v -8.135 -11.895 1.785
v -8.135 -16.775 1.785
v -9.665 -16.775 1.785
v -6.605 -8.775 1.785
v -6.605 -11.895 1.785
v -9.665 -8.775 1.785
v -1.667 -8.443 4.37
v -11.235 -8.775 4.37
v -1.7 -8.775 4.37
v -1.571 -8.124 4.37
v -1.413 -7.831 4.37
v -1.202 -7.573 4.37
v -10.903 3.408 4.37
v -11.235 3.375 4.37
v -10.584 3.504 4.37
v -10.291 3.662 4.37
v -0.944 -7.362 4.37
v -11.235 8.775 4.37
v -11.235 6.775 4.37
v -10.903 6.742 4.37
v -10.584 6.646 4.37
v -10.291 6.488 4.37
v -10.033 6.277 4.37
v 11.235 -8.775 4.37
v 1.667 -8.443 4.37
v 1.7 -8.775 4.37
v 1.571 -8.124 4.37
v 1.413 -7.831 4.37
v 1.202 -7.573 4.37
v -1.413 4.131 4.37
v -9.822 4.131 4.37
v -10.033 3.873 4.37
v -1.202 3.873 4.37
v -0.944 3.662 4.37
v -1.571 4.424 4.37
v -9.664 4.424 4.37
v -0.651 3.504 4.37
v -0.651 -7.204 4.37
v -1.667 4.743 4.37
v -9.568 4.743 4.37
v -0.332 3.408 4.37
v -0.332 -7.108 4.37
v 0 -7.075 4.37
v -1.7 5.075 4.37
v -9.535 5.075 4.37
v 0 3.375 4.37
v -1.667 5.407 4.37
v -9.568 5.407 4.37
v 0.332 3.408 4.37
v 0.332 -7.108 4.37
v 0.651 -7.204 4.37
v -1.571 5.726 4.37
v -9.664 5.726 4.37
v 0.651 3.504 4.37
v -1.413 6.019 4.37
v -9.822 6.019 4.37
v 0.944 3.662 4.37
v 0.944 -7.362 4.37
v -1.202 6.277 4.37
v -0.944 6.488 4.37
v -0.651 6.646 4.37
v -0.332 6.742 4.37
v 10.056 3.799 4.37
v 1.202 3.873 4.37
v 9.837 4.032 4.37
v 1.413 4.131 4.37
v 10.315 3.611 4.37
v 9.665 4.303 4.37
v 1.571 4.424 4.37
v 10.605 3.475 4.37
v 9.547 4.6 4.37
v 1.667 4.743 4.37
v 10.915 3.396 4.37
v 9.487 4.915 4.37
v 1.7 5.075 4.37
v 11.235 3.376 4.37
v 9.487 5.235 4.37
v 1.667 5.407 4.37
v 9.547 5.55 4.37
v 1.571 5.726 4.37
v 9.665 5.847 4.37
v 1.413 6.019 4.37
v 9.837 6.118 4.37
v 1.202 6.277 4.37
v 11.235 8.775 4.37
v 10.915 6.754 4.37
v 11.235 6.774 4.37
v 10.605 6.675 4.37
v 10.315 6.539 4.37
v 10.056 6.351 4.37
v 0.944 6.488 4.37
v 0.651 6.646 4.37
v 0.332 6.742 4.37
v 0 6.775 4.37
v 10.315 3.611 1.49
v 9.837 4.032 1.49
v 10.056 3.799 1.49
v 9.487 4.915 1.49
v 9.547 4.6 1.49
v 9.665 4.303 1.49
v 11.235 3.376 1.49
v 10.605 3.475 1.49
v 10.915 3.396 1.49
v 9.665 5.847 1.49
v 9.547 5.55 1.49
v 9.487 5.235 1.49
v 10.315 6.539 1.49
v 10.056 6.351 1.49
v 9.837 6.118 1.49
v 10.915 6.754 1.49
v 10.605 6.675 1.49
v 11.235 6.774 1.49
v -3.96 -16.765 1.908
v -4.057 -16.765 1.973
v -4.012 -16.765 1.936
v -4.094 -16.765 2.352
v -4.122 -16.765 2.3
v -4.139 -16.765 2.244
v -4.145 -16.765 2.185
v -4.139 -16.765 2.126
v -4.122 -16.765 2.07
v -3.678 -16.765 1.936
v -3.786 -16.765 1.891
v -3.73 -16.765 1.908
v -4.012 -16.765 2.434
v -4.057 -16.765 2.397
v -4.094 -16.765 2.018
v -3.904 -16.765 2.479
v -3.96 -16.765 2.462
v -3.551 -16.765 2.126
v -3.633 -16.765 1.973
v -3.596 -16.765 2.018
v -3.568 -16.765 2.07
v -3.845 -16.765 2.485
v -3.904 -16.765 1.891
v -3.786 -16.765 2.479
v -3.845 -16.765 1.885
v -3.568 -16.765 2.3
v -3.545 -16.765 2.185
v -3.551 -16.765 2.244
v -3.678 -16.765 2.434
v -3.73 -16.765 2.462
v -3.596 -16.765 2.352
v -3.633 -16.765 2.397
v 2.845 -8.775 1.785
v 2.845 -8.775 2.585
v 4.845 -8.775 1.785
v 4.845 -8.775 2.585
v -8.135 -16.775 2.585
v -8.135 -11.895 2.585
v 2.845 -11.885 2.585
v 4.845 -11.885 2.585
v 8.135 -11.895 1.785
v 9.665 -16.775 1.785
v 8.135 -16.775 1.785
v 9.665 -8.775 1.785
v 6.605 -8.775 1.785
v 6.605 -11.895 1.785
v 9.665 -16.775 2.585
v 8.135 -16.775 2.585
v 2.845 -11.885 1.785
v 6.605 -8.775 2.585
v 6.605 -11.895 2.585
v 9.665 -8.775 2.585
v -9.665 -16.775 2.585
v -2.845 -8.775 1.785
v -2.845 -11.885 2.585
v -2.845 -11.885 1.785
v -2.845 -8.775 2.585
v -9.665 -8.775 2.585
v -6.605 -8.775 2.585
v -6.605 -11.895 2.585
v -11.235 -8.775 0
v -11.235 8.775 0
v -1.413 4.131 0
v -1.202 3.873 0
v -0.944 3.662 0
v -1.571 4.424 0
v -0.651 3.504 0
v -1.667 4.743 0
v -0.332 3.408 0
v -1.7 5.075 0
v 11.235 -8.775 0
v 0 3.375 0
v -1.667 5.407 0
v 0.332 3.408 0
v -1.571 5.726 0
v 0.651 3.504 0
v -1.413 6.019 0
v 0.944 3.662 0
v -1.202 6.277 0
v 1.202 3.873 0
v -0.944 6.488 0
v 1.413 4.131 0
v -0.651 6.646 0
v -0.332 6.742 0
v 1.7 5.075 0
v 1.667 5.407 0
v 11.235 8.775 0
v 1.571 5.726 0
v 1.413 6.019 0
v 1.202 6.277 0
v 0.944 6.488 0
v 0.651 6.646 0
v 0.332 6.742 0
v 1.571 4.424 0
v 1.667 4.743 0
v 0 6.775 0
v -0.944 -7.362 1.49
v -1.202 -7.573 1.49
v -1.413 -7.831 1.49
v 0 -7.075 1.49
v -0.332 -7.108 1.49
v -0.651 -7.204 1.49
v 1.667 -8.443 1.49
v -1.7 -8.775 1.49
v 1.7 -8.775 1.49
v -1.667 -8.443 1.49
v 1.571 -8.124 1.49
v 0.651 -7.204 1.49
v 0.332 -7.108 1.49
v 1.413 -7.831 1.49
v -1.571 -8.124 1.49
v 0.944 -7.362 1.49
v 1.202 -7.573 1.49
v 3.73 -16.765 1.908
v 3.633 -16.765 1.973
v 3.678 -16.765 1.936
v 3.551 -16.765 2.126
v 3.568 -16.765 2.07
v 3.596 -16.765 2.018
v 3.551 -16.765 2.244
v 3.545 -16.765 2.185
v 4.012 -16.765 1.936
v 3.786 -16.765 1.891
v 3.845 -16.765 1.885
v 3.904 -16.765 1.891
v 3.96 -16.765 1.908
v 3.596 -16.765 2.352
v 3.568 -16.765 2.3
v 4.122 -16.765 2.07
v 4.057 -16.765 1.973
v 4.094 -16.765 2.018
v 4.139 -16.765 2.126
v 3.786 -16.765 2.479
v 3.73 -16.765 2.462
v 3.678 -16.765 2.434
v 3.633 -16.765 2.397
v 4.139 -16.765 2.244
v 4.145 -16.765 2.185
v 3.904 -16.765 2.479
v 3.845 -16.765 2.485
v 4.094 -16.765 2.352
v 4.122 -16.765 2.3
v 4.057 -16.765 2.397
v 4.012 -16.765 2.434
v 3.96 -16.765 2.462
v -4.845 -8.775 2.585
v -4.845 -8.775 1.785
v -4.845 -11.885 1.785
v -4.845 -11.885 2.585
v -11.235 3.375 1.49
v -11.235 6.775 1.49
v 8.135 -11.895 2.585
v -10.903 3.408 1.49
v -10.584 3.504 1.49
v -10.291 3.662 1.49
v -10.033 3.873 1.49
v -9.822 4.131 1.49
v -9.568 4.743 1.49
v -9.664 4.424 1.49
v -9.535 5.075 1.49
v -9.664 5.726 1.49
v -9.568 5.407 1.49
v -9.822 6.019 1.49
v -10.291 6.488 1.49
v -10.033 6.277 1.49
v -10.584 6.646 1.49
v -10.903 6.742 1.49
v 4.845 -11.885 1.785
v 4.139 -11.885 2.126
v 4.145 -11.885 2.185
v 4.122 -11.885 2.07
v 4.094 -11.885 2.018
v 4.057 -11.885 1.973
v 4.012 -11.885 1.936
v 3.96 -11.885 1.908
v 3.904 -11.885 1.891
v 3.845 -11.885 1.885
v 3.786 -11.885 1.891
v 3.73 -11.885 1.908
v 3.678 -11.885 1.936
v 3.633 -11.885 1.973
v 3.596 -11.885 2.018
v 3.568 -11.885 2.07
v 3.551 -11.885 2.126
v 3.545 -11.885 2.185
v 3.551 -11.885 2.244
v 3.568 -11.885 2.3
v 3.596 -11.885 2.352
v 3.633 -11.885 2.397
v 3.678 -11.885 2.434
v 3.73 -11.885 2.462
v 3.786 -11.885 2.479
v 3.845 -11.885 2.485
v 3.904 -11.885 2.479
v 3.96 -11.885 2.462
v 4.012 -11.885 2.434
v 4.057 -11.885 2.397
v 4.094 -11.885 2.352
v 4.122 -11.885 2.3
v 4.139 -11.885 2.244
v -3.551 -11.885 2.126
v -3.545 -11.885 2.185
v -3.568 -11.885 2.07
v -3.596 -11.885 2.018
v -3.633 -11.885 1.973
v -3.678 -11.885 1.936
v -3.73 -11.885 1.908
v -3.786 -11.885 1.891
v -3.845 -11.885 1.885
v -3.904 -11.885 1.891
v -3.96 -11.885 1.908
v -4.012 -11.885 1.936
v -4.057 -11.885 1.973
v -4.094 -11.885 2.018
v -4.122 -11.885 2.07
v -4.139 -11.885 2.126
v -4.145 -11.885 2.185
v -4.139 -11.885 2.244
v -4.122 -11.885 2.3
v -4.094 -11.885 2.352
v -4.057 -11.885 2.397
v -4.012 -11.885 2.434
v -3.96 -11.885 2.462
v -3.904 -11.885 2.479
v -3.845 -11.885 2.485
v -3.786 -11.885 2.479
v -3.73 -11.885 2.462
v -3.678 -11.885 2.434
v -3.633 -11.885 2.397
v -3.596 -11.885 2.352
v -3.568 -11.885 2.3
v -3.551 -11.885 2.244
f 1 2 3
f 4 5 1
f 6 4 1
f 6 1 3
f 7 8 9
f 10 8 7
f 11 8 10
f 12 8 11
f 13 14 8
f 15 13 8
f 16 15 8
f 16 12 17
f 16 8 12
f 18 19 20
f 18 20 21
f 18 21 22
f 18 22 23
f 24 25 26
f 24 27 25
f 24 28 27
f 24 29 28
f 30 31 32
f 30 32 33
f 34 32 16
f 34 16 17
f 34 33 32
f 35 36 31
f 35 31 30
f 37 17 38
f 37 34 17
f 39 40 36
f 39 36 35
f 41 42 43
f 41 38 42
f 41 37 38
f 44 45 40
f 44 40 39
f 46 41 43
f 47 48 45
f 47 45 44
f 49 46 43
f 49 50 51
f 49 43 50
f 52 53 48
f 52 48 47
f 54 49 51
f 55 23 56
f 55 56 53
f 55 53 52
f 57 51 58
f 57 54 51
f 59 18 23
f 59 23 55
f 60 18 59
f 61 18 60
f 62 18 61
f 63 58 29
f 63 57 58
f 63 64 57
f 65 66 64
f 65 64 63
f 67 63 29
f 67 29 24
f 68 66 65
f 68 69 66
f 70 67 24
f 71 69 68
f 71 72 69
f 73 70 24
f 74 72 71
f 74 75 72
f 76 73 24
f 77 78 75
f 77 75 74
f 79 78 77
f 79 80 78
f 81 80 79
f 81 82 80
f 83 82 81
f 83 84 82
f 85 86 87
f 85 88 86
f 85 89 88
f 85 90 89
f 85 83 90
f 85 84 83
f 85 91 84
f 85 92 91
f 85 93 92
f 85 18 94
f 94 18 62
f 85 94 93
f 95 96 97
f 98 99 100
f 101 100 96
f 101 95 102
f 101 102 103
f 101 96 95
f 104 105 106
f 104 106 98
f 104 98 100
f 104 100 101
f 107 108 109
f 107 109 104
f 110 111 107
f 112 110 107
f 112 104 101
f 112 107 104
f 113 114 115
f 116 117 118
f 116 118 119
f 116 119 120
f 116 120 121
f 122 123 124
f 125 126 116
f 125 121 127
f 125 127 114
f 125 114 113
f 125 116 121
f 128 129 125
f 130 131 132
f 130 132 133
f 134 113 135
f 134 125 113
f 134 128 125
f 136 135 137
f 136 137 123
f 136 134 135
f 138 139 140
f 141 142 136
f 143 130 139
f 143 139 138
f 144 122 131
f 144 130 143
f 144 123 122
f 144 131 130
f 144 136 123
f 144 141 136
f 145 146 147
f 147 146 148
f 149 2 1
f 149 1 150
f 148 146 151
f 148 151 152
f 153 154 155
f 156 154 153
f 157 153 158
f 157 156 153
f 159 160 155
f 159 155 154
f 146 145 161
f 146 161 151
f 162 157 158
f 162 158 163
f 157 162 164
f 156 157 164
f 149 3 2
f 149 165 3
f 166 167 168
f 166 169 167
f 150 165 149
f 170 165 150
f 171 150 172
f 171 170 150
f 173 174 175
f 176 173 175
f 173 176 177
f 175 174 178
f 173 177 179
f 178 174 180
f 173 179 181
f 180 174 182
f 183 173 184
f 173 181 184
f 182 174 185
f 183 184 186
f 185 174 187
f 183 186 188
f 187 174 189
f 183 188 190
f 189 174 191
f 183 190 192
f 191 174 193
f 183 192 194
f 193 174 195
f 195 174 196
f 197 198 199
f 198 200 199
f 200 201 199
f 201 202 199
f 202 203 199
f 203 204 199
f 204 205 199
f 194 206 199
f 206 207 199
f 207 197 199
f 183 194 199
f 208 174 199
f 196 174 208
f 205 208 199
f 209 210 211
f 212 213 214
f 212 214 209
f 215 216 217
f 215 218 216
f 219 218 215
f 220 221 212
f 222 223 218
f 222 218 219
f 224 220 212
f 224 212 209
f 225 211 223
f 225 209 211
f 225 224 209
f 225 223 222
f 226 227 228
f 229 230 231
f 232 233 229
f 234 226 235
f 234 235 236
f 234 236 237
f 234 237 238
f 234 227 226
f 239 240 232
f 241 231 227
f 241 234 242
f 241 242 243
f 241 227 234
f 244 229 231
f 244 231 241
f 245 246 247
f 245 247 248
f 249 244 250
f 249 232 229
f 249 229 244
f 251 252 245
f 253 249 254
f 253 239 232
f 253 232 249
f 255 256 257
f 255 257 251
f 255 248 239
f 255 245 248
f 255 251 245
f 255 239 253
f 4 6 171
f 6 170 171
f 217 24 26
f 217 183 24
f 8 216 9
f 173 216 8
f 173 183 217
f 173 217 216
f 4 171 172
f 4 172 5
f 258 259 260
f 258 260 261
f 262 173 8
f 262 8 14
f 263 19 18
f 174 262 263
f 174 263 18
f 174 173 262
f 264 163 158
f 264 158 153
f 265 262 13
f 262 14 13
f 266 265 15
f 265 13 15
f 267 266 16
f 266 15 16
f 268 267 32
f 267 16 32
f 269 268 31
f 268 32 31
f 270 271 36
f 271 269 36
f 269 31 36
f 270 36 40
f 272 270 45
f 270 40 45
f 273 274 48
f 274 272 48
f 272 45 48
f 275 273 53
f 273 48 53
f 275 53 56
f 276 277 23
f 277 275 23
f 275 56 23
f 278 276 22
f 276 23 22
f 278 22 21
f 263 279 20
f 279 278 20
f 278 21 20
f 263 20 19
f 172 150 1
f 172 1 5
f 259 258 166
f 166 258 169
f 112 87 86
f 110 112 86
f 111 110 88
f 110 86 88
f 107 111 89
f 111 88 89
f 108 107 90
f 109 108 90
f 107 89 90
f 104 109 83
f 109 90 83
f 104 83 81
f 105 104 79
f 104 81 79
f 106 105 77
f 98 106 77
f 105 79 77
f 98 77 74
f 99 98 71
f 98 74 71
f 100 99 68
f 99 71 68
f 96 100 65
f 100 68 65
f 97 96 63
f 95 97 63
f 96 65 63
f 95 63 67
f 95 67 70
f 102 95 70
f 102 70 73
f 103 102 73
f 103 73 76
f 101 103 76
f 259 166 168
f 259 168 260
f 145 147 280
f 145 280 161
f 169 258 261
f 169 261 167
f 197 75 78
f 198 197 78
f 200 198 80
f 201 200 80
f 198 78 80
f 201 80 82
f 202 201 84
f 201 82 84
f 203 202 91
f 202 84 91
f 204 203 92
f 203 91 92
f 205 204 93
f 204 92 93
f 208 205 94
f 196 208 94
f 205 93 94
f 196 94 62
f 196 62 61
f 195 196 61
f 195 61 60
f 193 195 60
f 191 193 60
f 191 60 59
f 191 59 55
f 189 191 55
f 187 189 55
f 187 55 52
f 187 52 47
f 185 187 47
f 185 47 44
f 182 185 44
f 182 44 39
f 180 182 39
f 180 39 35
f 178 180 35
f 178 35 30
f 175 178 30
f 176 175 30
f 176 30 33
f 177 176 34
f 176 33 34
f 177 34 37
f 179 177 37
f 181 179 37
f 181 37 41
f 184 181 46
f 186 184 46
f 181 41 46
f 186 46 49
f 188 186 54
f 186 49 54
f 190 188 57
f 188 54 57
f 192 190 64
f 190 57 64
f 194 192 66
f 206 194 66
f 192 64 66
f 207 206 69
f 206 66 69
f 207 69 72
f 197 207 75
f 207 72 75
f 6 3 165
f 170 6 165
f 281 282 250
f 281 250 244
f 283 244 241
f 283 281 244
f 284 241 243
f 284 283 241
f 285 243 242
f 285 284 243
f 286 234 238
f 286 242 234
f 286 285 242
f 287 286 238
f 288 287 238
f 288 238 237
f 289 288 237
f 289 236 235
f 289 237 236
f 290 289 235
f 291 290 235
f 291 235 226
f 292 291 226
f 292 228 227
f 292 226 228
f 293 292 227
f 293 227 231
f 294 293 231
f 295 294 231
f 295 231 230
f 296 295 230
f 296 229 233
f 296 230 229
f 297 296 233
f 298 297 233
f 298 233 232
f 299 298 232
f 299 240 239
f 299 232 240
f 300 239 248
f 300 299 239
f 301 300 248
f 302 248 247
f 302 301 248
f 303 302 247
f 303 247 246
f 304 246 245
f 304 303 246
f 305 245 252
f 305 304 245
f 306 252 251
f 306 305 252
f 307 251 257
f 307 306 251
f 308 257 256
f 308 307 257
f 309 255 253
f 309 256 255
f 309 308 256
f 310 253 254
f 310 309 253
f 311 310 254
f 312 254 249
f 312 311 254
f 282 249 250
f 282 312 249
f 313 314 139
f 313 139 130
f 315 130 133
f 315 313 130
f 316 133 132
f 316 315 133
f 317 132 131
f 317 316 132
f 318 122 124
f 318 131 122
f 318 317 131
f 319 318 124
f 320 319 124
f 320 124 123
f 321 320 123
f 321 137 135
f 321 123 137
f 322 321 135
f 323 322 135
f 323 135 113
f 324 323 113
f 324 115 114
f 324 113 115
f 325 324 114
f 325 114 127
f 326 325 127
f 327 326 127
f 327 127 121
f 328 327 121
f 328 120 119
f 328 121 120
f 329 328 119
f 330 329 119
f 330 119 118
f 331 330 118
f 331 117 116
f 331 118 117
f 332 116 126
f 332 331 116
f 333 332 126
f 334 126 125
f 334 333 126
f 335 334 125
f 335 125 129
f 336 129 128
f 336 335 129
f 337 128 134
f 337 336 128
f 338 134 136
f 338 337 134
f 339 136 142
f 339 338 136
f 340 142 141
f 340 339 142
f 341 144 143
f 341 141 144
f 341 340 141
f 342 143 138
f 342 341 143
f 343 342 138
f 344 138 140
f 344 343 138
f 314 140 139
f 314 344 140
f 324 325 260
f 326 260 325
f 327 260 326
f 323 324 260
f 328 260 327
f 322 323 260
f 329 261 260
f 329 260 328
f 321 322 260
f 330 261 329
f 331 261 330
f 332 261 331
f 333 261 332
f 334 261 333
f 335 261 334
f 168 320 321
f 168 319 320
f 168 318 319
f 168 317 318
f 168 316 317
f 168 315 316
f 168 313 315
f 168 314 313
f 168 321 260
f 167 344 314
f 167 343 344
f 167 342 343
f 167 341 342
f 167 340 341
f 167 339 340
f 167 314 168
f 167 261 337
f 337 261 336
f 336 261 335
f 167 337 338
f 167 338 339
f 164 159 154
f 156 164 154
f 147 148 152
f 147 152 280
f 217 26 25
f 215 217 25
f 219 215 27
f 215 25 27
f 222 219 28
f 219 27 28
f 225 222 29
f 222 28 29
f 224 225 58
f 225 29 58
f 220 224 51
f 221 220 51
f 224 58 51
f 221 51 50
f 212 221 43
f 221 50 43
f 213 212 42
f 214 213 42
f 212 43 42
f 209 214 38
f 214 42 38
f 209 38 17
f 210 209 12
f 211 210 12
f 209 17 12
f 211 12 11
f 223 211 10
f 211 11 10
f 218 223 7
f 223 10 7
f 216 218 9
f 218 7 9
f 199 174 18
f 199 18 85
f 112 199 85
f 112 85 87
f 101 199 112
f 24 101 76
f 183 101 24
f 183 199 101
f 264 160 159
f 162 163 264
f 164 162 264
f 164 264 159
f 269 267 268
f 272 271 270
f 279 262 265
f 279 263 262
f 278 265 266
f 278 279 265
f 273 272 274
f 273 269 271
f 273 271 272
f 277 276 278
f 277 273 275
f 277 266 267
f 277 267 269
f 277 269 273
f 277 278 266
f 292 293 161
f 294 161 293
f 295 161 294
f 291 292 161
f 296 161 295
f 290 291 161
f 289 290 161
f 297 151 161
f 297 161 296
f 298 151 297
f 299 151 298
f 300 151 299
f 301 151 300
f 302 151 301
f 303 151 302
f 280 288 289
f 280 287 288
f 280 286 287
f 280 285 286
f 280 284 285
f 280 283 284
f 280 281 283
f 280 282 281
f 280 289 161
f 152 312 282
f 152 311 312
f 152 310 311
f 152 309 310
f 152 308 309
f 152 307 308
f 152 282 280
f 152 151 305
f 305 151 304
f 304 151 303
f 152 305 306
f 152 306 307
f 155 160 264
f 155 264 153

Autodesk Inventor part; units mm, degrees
ref_plane "YZ Plane" through (0, 0, 0) normal (1, 0, 0) x (0, 1, 0)
ref_plane "XZ Plane" through (0, 0, 0) normal (0, 1, 0) x (-1, 0, 0)
ref_plane "XY Plane" through (0, 0, 0) normal (0, 0, 1) x (1, 0, 0)
sketch "Skizze1" plane through (0, 0, 0) normal (0, 0, 1) x (1, 0, 0)
  line L0 (-11.235, 8.775) -> (11.235, 8.775)
  line L1 (11.235, 8.775) -> (11.235, -8.775)
  line L2 (11.235, -8.775) -> (-11.235, -8.775)
  line L3 (-11.235, -8.775) -> (-11.235, 8.775)
  line L4 (-11.235, 8.775) -> (11.235, -8.775) construction
  point P0 (0, 0)
  point P1 (0, 0)
  dimension "d0" = 22.47
  dimension "d1" = 17.55
extrude "Extrusion1" add sketch "Skizze1" along normal blind 4.37
sketch "Skizze2" plane through (0, 0, 4.37) normal (0, 0, 1) x (1, 0, 0)
  line L0 (11.235, 8.775) -> (-11.235, 8.775) construction
  line L1 (-11.235, 8.775) -> (-11.235, 6.775) construction
  line L2 (-11.235, 8.775) -> (-11.235, -8.775) construction
  line L3 (-11.235, 6.775) -> (0, 6.775) construction
  line L4 (0, 6.775) -> (0, 5.075) construction
  circle A0 centre (0, 5.075) radius 1.7
  point P0 (0, 0)
  dimension "d4" = 2
  dimension "d5" = 1.7
  dimension "d6" = 3.4
extrude "Extrusion2" cut sketch "Skizze2" against normal blind 4.37
sketch "Skizze4" plane through (0, 0, 4.37) normal (0, 0, 1) x (1, 0, 0)
  circle A0 centre (0, 5.075) radius 1.7 projected
  line L0 (-11.235, 8.775) -> (-11.235, -8.775) construction
  line L1 (-11.235, 5.075) -> (11.1798, 5.075) construction
  circle A1 centre (-11.235, 5.075) radius 1.7
  circle A2 centre (11.1798, 5.075) radius 1.7
  line L2 (-11.235, -8.775) -> (11.235, -8.775) construction
  circle A3 centre (0, -8.775) radius 1.7
  point P0 (0, 0)
  dimension "d14" = 3.4
  dimension "d15" = 3.4
  dimension "d16" = 3.4
extrude "Extrusion4" cut sketch "Skizze4" against normal blind 2.88 contours A1 | A2 | A3
sketch "Skizze5" plane through (-11.235, -8.775, 0) normal (0, -1, 0) x (1, 0, 0)
  line L0 (9.535, 1.49) -> (9.535, 4.37) projected
  line L1 (0, 4.37) -> (9.535, 4.37) projected
  line L2 (0, 0) -> (0, 4.37) projected
  line L3 (22.47, 0) -> (0, 0) projected
  line L4 (22.47, 0) -> (22.47, 4.37) projected
  line L5 (12.935, 4.37) -> (22.47, 4.37) projected
  line L6 (12.935, 4.37) -> (12.935, 1.49) projected
  line L7 (12.935, 1.49) -> (9.535, 1.49) projected
  line L8 (0, 0) -> (0, 4.37) projected
  line L9 (0, 2.185) -> (1.57, 2.185) construction
  line L10 (22.47, 0) -> (22.47, 4.37) projected
  line L11 (22.47, 2.185) -> (20.9, 2.185) construction
  line L12 (1.57, 2.585) -> (4.63, 2.585)
  line L13 (4.63, 2.585) -> (4.63, 1.785)
  line L14 (4.63, 1.785) -> (1.57, 1.785)
  line L15 (1.57, 1.785) -> (1.57, 2.585)
  line L16 (17.84, 2.585) -> (20.9, 2.585)
  line L17 (20.9, 2.585) -> (20.9, 1.785)
  line L18 (20.9, 1.785) -> (17.84, 1.785)
  line L19 (17.84, 1.785) -> (17.84, 2.585)
  point P0 (11.235, 0)
  dimension "d19" = 1.57
  dimension "d20" = 1.57
  dimension "d21" = 3.06
  dimension "d22" = 0.8
  dimension "d23" = 3.06
  dimension "d24" = 0.8
extrude "Extrusion5" add sketch "Skizze5" along normal blind 8 separate body contours L12 L13 L14 L15 | L16 L17 L18 L19
sketch "Skizze6" plane through (-11.235, -16.775, 0) normal (0, -1, 0) x (1, 0, 0)
  line L0 (1.57, 1.785) -> (1.57, 2.585) construction
  line L1 (1.57, 2.185) -> (3.11, 2.185) construction
  line L2 (20.9, 1.785) -> (20.9, 2.585) construction
  line L3 (20.9, 2.185) -> (19.36, 2.185) construction
  line L4 (4.63, 2.585) -> (4.63, 1.785) projected
  line L5 (4.63, 2.585) -> (1.57, 2.585) projected
  line L6 (4.63, 1.785) -> (3.1, 1.785)
  line L7 (3.1, 1.785) -> (3.1, 2.585)
  line L8 (3.1, 2.585) -> (4.63, 2.585)
  line L9 (4.63, 2.585) -> (4.63, 1.785)
  line L10 (17.84, 2.585) -> (17.84, 1.785) projected
  line L11 (17.84, 1.785) -> (20.9, 1.785) projected
  line L12 (17.84, 2.585) -> (19.37, 2.585)
  line L13 (19.37, 2.585) -> (19.37, 1.785)
  line L14 (19.37, 1.785) -> (17.84, 1.785)
  line L15 (17.84, 1.785) -> (17.84, 2.585)
  point P0 (11.235, 0)
  dimension "d27" = 1.54
  dimension "d28" = 1.54
extrude "Extrusion6" cut sketch "Skizze6" against normal blind 4.88 bodies 2
sketch "Skizze7" plane through (-11.235, -8.775, 0) normal (0, -1, 0) x (1, 0, 0)
  line L0 (4.63, 2.585) -> (4.63, 1.785) construction
  line L1 (4.63, 2.185) -> (6.39, 2.185) construction
  line L2 (17.84, 2.585) -> (17.84, 1.785) construction
  line L3 (17.84, 2.185) -> (16.08, 2.185) construction
  line L4 (6.39, 2.585) -> (8.39, 2.585)
  line L5 (8.39, 2.585) -> (8.39, 1.785)
  line L6 (8.39, 1.785) -> (6.39, 1.785)
  line L7 (6.39, 1.785) -> (6.39, 2.585)
  line L8 (14.08, 2.585) -> (16.08, 2.585)
  line L9 (16.08, 2.585) -> (16.08, 1.785)
  line L10 (16.08, 1.785) -> (14.08, 1.785)
  line L11 (14.08, 1.785) -> (14.08, 2.585)
  point P0 (11.235, 0)
  dimension "d31" = 1.76
  dimension "d32" = 1.76
  dimension "d33" = 2
  dimension "d34" = 0.8
  dimension "d35" = 2
  dimension "d36" = 0.8
extrude "Extrusion7" add sketch "Skizze7" along normal blind 3.11 separate body
sketch "Skizze8" plane through (-11.235, -11.885, 0) normal (0, -1, 0) x (1, 0, 0)
  line L0 (8.39, 2.585) -> (6.39, 2.585) projected
  line L1 (6.39, 2.585) -> (6.39, 1.785) projected
  line L2 (6.39, 1.785) -> (8.39, 1.785) projected
  line L3 (8.39, 1.785) -> (8.39, 2.585) projected
  line L4 (16.08, 2.585) -> (14.08, 2.585) projected
  line L5 (14.08, 2.585) -> (14.08, 1.785) projected
  line L6 (14.08, 1.785) -> (16.08, 1.785) projected
  line L7 (16.08, 1.785) -> (16.08, 2.585) projected
  line L8 (6.39, 2.585) -> (8.39, 2.585) projected
  line L9 (8.39, 2.585) -> (8.39, 1.785) projected
  line L10 (6.39, 2.585) -> (8.39, 1.785) construction
  line L11 (16.08, 2.585) -> (14.08, 2.585) construction
  line L12 (14.08, 2.585) -> (16.08, 1.785) construction
  circle A0 centre (7.39, 2.185) radius 0.3
  circle A1 centre (15.08, 2.185) radius 0.3
  point P0 (11.235, 0)
  dimension "d39" = 0.6
  dimension "d40" = 0.6
extrude "Extrusion8" add sketch "Skizze8" along normal blind 4.88 contours A0 | A1 bodies 3
properties part number "schunt"
